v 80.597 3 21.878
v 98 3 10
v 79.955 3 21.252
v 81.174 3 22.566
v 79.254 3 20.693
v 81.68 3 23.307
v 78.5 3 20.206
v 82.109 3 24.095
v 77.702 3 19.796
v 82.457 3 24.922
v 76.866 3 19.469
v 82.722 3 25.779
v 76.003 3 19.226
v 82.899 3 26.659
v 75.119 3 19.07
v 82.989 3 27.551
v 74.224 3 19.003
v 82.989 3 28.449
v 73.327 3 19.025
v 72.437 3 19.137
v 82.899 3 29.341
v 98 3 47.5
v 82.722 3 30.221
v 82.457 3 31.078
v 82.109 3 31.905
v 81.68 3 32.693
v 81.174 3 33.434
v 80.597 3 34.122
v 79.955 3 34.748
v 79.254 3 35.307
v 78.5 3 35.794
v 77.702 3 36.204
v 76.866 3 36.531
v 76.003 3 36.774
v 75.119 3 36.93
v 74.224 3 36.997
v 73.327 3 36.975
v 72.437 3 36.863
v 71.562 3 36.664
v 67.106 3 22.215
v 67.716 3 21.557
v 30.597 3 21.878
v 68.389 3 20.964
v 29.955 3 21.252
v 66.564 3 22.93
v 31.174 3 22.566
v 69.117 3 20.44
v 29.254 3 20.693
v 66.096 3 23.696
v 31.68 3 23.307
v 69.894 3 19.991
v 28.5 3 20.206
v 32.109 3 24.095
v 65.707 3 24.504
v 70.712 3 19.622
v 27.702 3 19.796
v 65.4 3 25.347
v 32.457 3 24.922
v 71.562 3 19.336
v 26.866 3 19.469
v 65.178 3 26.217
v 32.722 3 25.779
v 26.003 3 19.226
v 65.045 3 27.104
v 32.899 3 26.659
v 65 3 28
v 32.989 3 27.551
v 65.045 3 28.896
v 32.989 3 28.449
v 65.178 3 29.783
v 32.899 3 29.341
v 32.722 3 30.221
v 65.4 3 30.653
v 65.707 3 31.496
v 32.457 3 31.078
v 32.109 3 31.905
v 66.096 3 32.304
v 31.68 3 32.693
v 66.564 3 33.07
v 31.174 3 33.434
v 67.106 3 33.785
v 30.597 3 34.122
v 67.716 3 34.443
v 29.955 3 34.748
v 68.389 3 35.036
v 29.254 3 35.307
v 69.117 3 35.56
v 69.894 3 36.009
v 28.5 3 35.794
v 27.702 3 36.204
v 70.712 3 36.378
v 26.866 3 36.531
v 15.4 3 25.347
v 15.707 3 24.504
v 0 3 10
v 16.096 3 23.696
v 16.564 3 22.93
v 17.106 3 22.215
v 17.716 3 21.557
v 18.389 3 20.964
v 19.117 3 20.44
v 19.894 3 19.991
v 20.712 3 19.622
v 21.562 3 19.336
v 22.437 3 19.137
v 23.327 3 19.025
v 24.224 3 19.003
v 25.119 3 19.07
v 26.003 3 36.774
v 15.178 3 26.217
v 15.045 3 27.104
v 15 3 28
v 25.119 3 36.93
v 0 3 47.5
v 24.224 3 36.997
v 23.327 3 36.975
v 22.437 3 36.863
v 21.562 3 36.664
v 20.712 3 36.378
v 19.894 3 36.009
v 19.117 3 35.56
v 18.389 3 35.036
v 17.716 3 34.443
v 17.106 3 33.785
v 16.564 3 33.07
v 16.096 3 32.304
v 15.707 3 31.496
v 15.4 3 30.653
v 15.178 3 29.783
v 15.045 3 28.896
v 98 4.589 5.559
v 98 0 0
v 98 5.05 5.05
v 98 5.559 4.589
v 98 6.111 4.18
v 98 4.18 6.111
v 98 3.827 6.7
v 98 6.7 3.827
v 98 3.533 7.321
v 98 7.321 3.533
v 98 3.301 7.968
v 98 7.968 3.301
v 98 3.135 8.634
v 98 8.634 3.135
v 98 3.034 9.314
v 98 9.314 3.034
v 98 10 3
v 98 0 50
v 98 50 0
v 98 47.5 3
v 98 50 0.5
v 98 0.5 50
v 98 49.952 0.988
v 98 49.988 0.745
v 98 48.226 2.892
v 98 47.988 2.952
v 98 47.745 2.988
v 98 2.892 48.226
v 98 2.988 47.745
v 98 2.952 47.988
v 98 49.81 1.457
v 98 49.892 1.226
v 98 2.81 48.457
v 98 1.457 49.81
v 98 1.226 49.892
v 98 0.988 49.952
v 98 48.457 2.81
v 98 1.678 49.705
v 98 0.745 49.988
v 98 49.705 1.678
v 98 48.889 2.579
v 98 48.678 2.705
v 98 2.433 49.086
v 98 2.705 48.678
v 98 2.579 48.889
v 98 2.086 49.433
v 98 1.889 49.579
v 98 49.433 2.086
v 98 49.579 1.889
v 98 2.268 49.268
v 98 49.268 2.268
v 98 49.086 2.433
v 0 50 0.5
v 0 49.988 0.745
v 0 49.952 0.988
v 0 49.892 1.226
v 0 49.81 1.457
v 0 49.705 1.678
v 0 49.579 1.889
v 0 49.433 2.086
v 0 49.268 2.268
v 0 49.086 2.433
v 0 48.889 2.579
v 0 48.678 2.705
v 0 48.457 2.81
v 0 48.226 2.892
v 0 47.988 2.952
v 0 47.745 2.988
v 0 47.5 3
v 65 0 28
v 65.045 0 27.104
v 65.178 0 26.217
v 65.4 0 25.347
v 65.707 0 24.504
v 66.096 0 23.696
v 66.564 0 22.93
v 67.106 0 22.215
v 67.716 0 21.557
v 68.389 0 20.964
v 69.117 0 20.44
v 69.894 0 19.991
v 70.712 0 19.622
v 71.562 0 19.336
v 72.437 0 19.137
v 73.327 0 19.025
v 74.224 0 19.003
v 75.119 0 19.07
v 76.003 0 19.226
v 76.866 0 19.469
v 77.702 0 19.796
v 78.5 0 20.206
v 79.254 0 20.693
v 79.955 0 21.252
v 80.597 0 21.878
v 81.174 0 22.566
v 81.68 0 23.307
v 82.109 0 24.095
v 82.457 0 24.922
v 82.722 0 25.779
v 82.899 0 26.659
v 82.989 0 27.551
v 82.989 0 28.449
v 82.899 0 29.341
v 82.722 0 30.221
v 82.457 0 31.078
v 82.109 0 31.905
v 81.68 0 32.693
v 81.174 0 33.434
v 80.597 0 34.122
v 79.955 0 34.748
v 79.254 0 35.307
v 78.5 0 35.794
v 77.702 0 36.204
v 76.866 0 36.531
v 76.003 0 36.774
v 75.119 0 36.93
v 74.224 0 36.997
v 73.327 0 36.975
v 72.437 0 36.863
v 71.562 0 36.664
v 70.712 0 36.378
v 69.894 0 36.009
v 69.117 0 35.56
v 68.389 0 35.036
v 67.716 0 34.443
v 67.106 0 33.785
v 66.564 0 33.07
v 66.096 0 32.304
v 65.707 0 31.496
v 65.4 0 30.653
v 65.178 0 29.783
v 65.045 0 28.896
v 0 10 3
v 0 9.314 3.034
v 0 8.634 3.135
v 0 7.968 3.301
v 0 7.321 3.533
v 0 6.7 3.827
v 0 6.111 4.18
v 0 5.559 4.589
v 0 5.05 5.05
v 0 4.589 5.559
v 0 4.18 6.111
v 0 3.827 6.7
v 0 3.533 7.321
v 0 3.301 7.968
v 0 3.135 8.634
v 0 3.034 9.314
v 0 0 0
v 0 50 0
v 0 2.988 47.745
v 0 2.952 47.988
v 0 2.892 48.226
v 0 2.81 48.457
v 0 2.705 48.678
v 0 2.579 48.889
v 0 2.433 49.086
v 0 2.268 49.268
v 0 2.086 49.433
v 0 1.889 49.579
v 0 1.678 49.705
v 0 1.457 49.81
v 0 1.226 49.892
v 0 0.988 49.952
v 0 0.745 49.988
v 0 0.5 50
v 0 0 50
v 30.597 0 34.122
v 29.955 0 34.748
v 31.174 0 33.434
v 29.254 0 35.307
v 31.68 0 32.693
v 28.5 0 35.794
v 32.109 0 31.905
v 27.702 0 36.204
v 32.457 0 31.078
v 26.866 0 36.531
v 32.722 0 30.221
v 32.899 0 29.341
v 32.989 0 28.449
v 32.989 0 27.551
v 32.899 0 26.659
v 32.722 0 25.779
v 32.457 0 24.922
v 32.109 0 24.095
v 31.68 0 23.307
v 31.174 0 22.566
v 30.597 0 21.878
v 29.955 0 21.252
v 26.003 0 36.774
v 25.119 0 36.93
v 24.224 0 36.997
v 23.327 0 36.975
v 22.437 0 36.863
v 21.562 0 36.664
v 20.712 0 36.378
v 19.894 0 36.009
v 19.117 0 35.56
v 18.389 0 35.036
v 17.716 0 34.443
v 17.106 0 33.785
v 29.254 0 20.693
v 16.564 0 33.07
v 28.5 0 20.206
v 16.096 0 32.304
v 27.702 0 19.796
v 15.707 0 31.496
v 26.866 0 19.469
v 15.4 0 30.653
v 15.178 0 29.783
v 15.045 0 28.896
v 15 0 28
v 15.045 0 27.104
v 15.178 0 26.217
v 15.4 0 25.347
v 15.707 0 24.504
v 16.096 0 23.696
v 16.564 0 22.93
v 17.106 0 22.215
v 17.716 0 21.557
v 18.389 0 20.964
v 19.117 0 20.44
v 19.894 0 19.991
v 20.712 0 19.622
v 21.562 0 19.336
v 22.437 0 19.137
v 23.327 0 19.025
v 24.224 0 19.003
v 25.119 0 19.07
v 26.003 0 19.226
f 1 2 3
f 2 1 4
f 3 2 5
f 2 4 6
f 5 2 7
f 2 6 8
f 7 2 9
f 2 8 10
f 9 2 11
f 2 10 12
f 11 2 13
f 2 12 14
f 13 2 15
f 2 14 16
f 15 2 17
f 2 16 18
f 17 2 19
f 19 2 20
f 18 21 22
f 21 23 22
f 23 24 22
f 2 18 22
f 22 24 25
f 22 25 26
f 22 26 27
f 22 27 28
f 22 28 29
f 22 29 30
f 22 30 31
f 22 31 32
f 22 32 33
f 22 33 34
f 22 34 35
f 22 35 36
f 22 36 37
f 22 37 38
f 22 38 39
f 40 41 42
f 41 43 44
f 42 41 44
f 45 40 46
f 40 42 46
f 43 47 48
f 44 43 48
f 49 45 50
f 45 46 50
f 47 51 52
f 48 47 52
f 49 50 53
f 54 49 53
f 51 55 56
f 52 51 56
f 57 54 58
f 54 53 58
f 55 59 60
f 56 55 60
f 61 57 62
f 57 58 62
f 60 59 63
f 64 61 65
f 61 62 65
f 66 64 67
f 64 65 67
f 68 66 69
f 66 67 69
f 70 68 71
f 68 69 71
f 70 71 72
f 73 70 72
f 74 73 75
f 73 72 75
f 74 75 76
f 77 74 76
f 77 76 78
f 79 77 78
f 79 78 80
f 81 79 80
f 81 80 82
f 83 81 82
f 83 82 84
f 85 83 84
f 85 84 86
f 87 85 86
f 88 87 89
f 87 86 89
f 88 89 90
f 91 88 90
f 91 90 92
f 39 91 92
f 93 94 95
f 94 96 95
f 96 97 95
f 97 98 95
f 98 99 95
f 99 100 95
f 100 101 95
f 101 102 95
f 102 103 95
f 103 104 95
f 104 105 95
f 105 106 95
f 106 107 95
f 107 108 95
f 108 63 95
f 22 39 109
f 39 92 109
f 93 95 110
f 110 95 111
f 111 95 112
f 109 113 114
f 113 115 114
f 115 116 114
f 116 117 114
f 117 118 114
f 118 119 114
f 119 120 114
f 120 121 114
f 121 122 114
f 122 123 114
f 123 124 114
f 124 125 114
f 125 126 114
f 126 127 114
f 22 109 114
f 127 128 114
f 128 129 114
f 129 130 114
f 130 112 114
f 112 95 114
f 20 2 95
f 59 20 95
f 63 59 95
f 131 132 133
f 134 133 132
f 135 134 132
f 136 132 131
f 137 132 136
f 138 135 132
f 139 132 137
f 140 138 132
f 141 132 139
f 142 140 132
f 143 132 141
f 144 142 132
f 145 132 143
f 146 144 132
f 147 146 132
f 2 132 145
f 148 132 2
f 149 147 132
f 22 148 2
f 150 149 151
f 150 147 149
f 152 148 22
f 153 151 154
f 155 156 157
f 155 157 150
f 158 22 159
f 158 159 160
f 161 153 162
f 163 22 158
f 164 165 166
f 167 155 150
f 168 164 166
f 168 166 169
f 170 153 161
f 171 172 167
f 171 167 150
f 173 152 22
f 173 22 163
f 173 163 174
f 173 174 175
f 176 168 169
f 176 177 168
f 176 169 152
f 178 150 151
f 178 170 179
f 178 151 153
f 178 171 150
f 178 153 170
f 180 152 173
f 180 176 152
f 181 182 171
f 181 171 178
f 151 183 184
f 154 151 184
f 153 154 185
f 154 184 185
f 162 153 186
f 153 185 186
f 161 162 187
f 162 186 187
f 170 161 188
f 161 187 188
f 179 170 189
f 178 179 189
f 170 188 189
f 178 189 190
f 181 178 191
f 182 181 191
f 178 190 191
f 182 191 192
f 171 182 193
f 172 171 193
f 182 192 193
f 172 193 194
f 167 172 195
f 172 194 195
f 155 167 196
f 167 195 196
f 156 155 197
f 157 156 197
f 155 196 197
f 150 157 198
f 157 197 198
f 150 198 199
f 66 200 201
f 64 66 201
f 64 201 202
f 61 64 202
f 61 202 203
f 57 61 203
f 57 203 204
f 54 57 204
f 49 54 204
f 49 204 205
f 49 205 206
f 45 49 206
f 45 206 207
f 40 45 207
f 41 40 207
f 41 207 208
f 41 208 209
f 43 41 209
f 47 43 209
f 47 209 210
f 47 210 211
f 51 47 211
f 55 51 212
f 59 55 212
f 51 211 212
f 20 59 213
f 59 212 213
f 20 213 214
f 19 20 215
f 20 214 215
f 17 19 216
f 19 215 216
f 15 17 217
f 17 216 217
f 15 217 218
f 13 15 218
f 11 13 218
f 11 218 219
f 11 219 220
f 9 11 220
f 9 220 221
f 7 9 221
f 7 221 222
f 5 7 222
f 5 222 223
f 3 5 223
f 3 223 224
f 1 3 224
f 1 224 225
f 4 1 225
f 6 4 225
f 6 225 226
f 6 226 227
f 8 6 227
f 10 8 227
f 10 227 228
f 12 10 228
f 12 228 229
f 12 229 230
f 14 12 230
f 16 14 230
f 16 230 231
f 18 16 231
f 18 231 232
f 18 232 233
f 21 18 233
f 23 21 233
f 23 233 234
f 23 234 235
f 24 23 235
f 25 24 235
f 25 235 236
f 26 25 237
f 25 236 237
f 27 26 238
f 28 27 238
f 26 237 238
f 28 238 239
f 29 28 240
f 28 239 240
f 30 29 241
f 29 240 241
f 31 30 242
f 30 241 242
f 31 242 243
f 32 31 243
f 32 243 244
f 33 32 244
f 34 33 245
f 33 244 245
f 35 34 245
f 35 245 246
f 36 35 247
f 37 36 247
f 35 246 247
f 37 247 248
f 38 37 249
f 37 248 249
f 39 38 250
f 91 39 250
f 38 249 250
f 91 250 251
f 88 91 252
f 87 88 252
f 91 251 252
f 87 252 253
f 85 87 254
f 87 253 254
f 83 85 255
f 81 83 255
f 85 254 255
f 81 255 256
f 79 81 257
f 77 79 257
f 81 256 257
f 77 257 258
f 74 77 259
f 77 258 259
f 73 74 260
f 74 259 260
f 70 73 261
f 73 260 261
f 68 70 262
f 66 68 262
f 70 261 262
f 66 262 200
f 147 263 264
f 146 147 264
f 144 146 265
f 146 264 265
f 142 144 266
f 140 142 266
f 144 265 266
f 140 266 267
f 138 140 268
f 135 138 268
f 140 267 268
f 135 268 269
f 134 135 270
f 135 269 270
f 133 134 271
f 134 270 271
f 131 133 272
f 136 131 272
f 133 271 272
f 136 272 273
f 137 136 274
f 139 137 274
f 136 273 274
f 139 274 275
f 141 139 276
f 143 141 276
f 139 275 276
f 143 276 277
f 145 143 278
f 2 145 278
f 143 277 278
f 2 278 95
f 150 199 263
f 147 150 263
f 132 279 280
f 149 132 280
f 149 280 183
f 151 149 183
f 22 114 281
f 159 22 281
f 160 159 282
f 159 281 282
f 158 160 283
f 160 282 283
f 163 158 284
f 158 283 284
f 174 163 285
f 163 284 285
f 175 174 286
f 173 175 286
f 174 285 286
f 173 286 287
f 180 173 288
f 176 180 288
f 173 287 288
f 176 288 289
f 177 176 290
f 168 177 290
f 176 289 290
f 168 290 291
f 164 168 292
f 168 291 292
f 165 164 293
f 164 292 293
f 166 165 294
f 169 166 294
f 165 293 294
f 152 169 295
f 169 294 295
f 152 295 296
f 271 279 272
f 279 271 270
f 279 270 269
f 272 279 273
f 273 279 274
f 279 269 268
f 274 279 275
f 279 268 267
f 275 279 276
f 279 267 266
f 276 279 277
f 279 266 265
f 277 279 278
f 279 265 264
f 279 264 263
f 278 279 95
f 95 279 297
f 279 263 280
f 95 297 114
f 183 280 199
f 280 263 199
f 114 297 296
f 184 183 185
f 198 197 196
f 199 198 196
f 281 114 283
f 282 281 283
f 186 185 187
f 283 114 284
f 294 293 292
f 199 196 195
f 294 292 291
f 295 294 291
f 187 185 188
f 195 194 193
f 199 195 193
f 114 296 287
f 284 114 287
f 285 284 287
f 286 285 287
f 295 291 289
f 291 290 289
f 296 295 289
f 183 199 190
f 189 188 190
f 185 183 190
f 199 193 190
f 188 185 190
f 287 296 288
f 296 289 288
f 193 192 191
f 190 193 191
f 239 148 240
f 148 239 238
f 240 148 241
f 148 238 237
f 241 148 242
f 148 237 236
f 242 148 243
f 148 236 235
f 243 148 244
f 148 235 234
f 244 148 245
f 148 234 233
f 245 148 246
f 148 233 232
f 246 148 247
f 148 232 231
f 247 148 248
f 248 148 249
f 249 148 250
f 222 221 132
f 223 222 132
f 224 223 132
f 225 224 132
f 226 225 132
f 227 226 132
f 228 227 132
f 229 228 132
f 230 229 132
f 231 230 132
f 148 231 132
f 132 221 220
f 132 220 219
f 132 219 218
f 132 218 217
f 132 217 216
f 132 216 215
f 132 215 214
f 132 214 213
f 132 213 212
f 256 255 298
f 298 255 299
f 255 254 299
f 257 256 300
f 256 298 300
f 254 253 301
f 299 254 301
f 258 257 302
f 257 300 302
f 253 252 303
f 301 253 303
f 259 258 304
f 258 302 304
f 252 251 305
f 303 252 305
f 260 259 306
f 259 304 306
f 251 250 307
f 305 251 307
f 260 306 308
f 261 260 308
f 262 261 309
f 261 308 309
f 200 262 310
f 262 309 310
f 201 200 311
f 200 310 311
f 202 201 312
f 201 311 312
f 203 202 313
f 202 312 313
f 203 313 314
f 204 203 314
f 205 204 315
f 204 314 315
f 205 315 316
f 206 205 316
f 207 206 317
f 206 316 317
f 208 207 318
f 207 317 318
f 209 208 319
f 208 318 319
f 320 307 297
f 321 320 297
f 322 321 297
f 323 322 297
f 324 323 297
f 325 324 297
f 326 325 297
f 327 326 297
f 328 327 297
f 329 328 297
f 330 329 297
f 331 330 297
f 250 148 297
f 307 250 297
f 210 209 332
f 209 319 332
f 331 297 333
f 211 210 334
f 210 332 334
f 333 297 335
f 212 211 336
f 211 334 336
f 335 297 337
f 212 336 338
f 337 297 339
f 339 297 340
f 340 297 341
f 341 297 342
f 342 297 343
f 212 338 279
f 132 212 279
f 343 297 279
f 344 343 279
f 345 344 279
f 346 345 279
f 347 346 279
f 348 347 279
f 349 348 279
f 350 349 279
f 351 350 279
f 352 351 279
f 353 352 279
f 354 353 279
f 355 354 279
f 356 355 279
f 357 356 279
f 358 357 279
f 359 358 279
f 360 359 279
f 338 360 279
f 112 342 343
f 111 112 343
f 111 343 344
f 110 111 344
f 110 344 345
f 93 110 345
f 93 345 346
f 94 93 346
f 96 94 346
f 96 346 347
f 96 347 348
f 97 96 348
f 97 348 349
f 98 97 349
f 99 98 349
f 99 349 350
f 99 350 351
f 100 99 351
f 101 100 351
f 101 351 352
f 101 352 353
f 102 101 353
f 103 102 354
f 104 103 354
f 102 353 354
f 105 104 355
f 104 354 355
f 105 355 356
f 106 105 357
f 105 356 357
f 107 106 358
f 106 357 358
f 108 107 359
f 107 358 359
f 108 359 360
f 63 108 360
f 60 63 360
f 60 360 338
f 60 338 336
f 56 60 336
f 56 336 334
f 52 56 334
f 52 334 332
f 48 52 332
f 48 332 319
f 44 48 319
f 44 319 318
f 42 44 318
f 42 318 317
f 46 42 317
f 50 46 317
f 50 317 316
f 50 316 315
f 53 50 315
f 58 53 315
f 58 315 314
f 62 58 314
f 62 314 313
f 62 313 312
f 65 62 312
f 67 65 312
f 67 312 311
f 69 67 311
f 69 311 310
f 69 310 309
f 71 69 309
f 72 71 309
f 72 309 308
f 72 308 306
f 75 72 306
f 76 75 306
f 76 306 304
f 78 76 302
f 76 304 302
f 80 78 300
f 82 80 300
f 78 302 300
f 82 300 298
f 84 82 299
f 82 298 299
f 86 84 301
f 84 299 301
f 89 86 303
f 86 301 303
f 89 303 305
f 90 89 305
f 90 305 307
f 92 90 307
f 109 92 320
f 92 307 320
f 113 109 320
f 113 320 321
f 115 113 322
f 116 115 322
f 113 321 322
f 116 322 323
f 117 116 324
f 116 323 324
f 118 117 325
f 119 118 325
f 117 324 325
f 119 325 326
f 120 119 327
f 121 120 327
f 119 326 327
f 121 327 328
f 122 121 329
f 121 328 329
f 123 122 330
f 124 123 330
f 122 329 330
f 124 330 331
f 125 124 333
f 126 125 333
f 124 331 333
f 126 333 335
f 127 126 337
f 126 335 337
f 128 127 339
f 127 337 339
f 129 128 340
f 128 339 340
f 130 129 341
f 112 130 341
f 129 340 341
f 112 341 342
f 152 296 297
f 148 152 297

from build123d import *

# Parameters (mm, degrees)
ANGLES_EQUAL_50_X_50_X_3_1_DEPTH = 98
F_18_0_18_DIAMETER_HOLE1_D       = 18
LPATTERN1_COUNT                  = 2
LPATTERN1_PITCH                  = 50


with BuildPart() as part:
    # Sketch14 → Angles equal 50 X 50 X 3(1) (new body)
    with BuildSketch(Plane(origin=(0, 25, 25), x_dir=(0, 1, 0), z_dir=(1, 0, 0))):
        with BuildLine():
            Line((-25, 25), (-25, -25))
            Line((-25, -25), (25, -25))
            Line((25, -25), (25, -24.5))
            ThreePointArc((25, -24.5), (24.267766953, -22.732233047), (22.5, -22))
            Line((22.5, -22), (-15, -22))
            ThreePointArc((-15, -22), (-19.949747468, -19.949747468), (-22, -15))
            Line((-22, -15), (-22, 22.5))
            ThreePointArc((-22, 22.5), (-22.732233047, 24.267766953), (-24.5, 25))
            Line((-24.5, 25), (-25, 25))
        make_face()
    extrude(amount=ANGLES_EQUAL_50_X_50_X_3_1_DEPTH)

    # Ø18.0 (18) Diameter Hole1 (through all)
    with Locations(Plane(origin=(0, 3, 0), x_dir=(1, 0, 0), z_dir=(0, 1, 0))):
        with Locations((24, -28)):
            f_18_0_18_diameter_hole1 = Hole(F_18_0_18_DIAMETER_HOLE1_D / 2)

    # LPattern1: Ø18.0 (18) Diameter Hole1 ×2
    with Locations(*[(i * LPATTERN1_PITCH, 0, 0) for i in range(1, LPATTERN1_COUNT)]):
        add(f_18_0_18_diameter_hole1, mode=Mode.SUBTRACT)


solid = part.part
